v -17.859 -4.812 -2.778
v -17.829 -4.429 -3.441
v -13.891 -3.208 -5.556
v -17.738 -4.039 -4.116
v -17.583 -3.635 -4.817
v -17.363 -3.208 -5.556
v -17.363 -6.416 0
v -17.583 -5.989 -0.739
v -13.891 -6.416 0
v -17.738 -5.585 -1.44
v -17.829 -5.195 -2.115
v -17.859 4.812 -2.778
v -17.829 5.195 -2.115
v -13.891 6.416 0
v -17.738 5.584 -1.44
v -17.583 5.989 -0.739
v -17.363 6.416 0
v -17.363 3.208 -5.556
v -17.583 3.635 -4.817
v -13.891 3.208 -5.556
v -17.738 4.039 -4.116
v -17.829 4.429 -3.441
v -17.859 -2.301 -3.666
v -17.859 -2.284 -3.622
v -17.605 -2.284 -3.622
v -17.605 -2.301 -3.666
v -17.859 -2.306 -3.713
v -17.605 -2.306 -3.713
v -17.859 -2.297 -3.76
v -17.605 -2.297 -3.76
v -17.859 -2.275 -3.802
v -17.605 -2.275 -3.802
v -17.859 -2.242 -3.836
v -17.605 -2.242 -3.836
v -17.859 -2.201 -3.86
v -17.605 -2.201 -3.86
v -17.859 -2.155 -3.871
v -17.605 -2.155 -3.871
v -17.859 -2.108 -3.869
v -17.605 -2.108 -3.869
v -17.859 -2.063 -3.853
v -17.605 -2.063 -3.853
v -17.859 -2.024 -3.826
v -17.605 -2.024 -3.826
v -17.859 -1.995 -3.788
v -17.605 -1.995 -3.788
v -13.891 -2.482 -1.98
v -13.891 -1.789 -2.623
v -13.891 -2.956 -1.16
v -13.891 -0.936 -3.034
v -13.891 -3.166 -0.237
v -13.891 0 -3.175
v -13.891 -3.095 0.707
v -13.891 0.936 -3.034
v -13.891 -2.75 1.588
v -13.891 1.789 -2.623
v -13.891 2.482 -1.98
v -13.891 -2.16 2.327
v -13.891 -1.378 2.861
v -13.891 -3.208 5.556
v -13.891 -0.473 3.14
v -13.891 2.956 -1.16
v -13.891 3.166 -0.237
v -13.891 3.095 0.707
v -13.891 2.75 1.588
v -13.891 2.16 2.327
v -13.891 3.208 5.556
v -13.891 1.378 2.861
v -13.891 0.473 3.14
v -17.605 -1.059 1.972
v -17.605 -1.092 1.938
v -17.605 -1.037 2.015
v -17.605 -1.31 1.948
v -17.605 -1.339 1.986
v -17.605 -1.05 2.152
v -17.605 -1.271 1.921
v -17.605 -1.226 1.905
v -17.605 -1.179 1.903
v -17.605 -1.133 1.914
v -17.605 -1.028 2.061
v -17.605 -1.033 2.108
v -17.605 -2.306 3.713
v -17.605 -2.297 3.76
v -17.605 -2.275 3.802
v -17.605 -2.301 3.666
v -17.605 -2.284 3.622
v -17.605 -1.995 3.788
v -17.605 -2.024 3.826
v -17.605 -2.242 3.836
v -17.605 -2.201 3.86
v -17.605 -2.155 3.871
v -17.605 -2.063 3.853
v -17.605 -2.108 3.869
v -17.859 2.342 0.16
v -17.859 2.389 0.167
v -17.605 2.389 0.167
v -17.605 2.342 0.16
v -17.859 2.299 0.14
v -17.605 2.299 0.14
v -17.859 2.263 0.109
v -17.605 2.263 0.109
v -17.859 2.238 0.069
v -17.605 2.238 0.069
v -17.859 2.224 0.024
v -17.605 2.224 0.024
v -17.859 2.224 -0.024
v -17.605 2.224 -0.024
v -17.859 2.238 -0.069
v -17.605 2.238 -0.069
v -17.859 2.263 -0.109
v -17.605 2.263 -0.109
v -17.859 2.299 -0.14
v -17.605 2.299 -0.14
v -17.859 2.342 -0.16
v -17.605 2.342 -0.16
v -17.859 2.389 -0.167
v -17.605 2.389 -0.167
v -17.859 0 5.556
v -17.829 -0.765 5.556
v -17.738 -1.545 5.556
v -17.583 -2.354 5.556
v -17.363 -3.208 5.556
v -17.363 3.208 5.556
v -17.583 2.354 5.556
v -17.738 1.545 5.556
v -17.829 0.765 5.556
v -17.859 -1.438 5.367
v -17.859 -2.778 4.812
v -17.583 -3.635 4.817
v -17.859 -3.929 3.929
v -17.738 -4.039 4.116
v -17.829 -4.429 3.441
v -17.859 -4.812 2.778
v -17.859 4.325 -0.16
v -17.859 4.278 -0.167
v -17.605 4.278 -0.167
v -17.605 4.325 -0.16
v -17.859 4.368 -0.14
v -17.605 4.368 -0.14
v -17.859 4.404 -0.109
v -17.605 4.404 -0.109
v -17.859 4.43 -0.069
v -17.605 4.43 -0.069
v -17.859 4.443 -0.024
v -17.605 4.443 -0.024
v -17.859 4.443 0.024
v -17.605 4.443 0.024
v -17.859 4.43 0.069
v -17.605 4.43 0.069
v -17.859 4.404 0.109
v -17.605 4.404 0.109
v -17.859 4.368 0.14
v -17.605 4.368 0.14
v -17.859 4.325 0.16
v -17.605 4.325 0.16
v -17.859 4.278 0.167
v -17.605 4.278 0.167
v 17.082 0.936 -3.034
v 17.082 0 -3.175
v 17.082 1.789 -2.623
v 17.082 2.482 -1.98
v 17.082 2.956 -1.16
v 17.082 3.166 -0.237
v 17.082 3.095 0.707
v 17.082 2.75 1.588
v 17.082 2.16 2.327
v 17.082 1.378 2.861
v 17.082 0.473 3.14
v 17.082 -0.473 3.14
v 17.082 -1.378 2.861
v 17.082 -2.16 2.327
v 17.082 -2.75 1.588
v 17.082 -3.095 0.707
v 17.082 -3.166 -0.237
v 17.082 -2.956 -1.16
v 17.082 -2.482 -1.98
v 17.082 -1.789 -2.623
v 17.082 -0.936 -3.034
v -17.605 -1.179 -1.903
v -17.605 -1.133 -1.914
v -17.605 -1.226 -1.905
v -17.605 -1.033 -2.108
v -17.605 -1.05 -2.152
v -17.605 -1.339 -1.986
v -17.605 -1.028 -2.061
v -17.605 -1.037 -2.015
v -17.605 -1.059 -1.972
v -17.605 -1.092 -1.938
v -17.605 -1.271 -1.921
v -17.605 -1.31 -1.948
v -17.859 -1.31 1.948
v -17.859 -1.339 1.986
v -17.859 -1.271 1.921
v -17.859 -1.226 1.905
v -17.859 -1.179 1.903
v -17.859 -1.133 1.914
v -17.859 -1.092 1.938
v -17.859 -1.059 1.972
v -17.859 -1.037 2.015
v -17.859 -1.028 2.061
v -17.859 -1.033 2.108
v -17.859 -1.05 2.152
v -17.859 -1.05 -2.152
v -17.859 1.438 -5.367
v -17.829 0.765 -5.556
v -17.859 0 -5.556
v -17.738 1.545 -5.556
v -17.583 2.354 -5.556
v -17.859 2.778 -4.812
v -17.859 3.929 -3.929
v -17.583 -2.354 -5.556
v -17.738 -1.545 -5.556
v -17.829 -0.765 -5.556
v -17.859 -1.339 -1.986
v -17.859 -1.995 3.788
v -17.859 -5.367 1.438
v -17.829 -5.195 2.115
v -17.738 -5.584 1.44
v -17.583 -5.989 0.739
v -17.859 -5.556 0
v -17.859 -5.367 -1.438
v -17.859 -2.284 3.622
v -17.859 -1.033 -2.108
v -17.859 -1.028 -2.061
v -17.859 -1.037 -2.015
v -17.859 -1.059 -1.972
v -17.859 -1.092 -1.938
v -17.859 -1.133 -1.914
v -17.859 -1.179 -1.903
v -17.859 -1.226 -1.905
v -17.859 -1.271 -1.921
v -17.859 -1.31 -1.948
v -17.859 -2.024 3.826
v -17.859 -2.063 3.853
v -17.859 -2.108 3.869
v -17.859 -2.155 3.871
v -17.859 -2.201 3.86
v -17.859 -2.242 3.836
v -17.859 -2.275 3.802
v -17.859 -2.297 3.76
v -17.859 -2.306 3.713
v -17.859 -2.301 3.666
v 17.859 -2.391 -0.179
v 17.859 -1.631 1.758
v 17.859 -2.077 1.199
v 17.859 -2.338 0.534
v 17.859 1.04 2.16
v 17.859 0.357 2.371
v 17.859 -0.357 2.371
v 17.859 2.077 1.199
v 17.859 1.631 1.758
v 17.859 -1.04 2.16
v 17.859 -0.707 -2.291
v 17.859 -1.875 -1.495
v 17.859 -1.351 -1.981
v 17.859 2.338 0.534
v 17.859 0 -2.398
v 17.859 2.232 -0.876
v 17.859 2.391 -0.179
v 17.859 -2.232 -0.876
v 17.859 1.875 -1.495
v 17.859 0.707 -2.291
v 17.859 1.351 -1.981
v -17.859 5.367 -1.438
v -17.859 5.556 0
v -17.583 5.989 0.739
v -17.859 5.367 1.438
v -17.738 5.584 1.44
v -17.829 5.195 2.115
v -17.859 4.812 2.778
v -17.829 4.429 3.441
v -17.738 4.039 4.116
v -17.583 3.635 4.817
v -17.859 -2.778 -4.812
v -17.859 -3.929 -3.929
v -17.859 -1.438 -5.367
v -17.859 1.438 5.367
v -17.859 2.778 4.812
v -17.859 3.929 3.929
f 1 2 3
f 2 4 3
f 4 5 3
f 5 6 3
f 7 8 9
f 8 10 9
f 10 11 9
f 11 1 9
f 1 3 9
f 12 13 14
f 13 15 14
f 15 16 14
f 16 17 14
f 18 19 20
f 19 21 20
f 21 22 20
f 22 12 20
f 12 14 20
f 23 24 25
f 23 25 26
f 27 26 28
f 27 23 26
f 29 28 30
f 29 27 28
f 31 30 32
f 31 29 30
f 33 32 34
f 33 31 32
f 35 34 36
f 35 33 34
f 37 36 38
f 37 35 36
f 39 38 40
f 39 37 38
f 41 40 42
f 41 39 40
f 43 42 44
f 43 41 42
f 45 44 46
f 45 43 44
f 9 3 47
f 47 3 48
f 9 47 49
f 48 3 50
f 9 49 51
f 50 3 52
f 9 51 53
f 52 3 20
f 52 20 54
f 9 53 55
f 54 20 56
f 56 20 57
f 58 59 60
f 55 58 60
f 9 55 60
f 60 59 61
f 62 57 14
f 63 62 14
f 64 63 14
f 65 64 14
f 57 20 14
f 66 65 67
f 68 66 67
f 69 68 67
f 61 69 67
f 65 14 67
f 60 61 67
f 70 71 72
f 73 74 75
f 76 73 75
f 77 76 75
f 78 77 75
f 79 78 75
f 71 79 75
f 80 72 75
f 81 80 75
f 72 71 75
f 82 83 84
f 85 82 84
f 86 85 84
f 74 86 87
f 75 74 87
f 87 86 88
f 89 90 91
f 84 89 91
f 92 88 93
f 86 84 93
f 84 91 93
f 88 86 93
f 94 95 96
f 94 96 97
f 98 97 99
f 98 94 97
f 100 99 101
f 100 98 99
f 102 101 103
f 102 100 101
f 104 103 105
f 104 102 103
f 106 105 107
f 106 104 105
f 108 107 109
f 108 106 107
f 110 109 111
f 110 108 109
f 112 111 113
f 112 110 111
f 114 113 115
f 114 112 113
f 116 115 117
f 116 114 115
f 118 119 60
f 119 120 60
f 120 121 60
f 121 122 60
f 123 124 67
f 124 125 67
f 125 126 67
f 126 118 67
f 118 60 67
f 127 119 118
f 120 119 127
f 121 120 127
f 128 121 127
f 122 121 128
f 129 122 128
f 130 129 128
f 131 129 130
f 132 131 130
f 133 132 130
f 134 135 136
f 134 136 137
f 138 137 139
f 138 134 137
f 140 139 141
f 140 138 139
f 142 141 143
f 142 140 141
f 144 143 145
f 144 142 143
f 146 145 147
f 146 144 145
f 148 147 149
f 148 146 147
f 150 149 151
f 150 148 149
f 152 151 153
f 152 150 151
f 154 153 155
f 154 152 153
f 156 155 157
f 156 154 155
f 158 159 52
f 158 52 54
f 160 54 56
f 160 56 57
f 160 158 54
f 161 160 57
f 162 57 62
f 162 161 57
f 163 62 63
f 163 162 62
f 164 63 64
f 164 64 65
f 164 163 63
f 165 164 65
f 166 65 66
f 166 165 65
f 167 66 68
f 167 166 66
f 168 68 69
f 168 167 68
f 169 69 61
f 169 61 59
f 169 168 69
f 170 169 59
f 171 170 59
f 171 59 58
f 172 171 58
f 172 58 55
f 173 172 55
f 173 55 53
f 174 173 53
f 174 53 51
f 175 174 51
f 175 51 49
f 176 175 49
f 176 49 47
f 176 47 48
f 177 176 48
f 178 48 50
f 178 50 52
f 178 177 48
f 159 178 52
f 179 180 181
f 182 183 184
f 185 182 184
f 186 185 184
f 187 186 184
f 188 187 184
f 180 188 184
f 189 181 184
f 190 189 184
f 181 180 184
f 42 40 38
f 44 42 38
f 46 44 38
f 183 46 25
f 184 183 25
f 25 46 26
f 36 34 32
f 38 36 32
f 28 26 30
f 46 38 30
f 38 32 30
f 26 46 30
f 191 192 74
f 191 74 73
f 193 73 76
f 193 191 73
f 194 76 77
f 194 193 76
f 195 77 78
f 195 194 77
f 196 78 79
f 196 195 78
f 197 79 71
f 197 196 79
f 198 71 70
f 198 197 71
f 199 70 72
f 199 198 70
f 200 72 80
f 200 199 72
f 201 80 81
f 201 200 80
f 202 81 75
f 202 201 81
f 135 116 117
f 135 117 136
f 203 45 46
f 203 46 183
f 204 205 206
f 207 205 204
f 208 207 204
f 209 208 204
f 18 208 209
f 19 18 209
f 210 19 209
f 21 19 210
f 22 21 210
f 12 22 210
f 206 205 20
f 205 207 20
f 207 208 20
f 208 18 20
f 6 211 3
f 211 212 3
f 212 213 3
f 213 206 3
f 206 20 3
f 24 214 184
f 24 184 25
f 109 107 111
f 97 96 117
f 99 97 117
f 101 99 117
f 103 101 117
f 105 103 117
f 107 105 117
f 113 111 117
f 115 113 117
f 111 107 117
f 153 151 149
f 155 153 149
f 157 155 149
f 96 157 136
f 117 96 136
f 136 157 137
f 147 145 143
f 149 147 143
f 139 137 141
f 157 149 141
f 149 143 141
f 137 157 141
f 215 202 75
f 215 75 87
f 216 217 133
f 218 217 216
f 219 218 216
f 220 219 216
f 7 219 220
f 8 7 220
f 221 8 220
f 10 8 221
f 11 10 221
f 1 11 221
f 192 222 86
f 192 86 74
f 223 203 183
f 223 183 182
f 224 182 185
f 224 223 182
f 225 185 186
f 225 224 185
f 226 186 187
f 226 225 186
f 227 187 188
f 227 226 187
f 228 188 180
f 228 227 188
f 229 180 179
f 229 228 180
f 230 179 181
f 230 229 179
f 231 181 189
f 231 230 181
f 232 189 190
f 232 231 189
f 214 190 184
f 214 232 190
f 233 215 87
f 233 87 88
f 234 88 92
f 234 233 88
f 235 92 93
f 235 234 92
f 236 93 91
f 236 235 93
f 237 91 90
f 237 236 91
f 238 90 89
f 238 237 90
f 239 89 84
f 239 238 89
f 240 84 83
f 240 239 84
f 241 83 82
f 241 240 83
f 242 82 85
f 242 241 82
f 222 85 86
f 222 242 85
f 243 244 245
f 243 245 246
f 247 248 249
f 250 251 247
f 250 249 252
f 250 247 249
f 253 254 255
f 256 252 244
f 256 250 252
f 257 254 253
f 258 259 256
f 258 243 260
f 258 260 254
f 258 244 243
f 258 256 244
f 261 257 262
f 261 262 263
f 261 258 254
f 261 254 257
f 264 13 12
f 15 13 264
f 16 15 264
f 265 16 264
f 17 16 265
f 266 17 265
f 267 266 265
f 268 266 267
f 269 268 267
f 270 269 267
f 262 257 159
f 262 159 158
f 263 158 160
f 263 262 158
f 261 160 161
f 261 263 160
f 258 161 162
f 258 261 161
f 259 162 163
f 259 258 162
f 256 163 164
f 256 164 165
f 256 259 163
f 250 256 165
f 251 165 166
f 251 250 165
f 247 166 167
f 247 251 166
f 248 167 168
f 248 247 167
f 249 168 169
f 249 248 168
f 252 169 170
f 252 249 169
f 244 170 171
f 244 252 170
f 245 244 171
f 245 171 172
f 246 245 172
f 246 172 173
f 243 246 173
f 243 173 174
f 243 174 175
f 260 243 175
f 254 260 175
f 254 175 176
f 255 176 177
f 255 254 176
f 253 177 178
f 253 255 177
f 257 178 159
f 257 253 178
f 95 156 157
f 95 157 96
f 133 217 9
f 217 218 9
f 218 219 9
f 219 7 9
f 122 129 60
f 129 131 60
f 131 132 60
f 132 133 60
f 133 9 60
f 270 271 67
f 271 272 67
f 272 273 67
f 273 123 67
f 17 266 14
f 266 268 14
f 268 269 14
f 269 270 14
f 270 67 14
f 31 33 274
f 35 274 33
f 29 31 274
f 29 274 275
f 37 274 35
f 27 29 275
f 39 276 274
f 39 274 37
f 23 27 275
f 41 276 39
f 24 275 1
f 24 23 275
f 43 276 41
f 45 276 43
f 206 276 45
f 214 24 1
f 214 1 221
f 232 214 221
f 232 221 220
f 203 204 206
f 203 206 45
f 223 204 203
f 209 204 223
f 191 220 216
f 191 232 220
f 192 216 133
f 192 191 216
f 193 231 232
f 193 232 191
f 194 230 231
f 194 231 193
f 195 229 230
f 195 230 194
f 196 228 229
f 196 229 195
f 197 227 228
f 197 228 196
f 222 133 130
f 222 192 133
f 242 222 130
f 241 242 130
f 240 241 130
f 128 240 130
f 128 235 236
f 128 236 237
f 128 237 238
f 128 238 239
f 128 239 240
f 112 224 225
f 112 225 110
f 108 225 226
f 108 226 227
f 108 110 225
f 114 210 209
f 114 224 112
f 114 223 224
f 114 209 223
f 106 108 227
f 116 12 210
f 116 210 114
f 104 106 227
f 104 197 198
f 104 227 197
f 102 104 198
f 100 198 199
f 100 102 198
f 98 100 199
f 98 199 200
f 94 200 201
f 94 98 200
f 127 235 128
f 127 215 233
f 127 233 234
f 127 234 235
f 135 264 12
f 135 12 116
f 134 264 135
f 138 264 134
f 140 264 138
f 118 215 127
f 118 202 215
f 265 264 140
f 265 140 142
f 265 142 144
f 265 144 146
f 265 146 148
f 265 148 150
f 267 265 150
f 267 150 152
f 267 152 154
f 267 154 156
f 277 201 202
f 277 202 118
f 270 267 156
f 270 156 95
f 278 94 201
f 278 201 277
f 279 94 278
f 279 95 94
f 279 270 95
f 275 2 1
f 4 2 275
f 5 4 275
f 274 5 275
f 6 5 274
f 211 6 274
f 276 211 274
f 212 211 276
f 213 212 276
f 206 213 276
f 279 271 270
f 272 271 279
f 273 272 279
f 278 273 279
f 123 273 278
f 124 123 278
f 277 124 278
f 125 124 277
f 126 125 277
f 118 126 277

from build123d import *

# Parameters (mm, degrees)
SKETCH5_R           = 3.175
BOSS_EXTRUDE3_DEPTH = 31.75
CHAMFER1_SIZE       = 0.77724
BOSS_EXTRUDE4_DEPTH = 3.96875
SKETCH8_OUTSIDE_W   = 148.218
SKETCH8_OUTSIDE_H   = 149.938
SKETCH8_OUTSIDE_R   = 5.55625
CUT_EXTRUDE3_DEPTH  = 36.71875
CUT_EXTRUDE3_TAPER  = 60
CUT_EXTRUDE4_DEPTH  = 0.254
CIRPATTERN1_COUNT   = 3


with BuildPart() as part:
    # Sketch5 → Boss-Extrude3 (new body)
    with BuildSketch(Plane(origin=(17.859375, 0, 0), x_dir=(0, 0, -1), z_dir=(1, 0, 0))):
        Circle(SKETCH5_R)
    extrude(amount=-BOSS_EXTRUDE3_DEPTH)

    # Chamfer1
    chamfer1_edges = [part.edges().sort_by_distance(p)[0] for p in [
        (17.859375, 0, 3.175),
    ]]
    chamfer(chamfer1_edges, length=CHAMFER1_SIZE)

    # Sketch6 → Boss-Extrude4 (add)
    with BuildSketch(Plane.ZY.offset(13.890625)):
        Polygon((5.55625, 3.207902433), (0, 6.415804866), (-5.55625, 3.207902433), (-5.55625, -3.207902433), (0, -6.415804866), (5.55625, -3.207902433), align=None)
    extrude(amount=BOSS_EXTRUDE4_DEPTH)

    # Sketch8 outside → Cut-Extrude3 (cut, through all)
    with BuildSketch(Plane.ZY.offset(17.859375)):
        Rectangle(SKETCH8_OUTSIDE_W, SKETCH8_OUTSIDE_H)
        Circle(SKETCH8_OUTSIDE_R, mode=Mode.SUBTRACT)
    extrude(amount=-CUT_EXTRUDE3_DEPTH, taper=CUT_EXTRUDE3_TAPER, mode=Mode.SUBTRACT)

    # Sketch12 → Cut-Extrude4 (cut)
    with BuildSketch(Plane.ZY.offset(17.859375)):
        with BuildLine():
            Line((0.1666875, 4.2783125), (0.1666875, 2.3891875))
            ThreePointArc((0.1666875, 2.3891875), (0, 2.2225), (-0.1666875, 2.3891875))
            Line((-0.1666875, 2.3891875), (-0.1666875, 4.2783125))
            ThreePointArc((-0.1666875, 4.2783125), (0, 4.445), (0.1666875, 4.2783125))
        make_face()
    cut_extrude4 = extrude(amount=-CUT_EXTRUDE4_DEPTH, mode=Mode.SUBTRACT)

    # CirPattern1: Cut-Extrude4 ×3 about axis
    cirpattern1_axis = Axis((0, 0, 0), (1, 0, 0))
    for i in range(1, CIRPATTERN1_COUNT):
        add(cut_extrude4.rotate(cirpattern1_axis, i * 360 / CIRPATTERN1_COUNT), mode=Mode.SUBTRACT)


solid = part.part
